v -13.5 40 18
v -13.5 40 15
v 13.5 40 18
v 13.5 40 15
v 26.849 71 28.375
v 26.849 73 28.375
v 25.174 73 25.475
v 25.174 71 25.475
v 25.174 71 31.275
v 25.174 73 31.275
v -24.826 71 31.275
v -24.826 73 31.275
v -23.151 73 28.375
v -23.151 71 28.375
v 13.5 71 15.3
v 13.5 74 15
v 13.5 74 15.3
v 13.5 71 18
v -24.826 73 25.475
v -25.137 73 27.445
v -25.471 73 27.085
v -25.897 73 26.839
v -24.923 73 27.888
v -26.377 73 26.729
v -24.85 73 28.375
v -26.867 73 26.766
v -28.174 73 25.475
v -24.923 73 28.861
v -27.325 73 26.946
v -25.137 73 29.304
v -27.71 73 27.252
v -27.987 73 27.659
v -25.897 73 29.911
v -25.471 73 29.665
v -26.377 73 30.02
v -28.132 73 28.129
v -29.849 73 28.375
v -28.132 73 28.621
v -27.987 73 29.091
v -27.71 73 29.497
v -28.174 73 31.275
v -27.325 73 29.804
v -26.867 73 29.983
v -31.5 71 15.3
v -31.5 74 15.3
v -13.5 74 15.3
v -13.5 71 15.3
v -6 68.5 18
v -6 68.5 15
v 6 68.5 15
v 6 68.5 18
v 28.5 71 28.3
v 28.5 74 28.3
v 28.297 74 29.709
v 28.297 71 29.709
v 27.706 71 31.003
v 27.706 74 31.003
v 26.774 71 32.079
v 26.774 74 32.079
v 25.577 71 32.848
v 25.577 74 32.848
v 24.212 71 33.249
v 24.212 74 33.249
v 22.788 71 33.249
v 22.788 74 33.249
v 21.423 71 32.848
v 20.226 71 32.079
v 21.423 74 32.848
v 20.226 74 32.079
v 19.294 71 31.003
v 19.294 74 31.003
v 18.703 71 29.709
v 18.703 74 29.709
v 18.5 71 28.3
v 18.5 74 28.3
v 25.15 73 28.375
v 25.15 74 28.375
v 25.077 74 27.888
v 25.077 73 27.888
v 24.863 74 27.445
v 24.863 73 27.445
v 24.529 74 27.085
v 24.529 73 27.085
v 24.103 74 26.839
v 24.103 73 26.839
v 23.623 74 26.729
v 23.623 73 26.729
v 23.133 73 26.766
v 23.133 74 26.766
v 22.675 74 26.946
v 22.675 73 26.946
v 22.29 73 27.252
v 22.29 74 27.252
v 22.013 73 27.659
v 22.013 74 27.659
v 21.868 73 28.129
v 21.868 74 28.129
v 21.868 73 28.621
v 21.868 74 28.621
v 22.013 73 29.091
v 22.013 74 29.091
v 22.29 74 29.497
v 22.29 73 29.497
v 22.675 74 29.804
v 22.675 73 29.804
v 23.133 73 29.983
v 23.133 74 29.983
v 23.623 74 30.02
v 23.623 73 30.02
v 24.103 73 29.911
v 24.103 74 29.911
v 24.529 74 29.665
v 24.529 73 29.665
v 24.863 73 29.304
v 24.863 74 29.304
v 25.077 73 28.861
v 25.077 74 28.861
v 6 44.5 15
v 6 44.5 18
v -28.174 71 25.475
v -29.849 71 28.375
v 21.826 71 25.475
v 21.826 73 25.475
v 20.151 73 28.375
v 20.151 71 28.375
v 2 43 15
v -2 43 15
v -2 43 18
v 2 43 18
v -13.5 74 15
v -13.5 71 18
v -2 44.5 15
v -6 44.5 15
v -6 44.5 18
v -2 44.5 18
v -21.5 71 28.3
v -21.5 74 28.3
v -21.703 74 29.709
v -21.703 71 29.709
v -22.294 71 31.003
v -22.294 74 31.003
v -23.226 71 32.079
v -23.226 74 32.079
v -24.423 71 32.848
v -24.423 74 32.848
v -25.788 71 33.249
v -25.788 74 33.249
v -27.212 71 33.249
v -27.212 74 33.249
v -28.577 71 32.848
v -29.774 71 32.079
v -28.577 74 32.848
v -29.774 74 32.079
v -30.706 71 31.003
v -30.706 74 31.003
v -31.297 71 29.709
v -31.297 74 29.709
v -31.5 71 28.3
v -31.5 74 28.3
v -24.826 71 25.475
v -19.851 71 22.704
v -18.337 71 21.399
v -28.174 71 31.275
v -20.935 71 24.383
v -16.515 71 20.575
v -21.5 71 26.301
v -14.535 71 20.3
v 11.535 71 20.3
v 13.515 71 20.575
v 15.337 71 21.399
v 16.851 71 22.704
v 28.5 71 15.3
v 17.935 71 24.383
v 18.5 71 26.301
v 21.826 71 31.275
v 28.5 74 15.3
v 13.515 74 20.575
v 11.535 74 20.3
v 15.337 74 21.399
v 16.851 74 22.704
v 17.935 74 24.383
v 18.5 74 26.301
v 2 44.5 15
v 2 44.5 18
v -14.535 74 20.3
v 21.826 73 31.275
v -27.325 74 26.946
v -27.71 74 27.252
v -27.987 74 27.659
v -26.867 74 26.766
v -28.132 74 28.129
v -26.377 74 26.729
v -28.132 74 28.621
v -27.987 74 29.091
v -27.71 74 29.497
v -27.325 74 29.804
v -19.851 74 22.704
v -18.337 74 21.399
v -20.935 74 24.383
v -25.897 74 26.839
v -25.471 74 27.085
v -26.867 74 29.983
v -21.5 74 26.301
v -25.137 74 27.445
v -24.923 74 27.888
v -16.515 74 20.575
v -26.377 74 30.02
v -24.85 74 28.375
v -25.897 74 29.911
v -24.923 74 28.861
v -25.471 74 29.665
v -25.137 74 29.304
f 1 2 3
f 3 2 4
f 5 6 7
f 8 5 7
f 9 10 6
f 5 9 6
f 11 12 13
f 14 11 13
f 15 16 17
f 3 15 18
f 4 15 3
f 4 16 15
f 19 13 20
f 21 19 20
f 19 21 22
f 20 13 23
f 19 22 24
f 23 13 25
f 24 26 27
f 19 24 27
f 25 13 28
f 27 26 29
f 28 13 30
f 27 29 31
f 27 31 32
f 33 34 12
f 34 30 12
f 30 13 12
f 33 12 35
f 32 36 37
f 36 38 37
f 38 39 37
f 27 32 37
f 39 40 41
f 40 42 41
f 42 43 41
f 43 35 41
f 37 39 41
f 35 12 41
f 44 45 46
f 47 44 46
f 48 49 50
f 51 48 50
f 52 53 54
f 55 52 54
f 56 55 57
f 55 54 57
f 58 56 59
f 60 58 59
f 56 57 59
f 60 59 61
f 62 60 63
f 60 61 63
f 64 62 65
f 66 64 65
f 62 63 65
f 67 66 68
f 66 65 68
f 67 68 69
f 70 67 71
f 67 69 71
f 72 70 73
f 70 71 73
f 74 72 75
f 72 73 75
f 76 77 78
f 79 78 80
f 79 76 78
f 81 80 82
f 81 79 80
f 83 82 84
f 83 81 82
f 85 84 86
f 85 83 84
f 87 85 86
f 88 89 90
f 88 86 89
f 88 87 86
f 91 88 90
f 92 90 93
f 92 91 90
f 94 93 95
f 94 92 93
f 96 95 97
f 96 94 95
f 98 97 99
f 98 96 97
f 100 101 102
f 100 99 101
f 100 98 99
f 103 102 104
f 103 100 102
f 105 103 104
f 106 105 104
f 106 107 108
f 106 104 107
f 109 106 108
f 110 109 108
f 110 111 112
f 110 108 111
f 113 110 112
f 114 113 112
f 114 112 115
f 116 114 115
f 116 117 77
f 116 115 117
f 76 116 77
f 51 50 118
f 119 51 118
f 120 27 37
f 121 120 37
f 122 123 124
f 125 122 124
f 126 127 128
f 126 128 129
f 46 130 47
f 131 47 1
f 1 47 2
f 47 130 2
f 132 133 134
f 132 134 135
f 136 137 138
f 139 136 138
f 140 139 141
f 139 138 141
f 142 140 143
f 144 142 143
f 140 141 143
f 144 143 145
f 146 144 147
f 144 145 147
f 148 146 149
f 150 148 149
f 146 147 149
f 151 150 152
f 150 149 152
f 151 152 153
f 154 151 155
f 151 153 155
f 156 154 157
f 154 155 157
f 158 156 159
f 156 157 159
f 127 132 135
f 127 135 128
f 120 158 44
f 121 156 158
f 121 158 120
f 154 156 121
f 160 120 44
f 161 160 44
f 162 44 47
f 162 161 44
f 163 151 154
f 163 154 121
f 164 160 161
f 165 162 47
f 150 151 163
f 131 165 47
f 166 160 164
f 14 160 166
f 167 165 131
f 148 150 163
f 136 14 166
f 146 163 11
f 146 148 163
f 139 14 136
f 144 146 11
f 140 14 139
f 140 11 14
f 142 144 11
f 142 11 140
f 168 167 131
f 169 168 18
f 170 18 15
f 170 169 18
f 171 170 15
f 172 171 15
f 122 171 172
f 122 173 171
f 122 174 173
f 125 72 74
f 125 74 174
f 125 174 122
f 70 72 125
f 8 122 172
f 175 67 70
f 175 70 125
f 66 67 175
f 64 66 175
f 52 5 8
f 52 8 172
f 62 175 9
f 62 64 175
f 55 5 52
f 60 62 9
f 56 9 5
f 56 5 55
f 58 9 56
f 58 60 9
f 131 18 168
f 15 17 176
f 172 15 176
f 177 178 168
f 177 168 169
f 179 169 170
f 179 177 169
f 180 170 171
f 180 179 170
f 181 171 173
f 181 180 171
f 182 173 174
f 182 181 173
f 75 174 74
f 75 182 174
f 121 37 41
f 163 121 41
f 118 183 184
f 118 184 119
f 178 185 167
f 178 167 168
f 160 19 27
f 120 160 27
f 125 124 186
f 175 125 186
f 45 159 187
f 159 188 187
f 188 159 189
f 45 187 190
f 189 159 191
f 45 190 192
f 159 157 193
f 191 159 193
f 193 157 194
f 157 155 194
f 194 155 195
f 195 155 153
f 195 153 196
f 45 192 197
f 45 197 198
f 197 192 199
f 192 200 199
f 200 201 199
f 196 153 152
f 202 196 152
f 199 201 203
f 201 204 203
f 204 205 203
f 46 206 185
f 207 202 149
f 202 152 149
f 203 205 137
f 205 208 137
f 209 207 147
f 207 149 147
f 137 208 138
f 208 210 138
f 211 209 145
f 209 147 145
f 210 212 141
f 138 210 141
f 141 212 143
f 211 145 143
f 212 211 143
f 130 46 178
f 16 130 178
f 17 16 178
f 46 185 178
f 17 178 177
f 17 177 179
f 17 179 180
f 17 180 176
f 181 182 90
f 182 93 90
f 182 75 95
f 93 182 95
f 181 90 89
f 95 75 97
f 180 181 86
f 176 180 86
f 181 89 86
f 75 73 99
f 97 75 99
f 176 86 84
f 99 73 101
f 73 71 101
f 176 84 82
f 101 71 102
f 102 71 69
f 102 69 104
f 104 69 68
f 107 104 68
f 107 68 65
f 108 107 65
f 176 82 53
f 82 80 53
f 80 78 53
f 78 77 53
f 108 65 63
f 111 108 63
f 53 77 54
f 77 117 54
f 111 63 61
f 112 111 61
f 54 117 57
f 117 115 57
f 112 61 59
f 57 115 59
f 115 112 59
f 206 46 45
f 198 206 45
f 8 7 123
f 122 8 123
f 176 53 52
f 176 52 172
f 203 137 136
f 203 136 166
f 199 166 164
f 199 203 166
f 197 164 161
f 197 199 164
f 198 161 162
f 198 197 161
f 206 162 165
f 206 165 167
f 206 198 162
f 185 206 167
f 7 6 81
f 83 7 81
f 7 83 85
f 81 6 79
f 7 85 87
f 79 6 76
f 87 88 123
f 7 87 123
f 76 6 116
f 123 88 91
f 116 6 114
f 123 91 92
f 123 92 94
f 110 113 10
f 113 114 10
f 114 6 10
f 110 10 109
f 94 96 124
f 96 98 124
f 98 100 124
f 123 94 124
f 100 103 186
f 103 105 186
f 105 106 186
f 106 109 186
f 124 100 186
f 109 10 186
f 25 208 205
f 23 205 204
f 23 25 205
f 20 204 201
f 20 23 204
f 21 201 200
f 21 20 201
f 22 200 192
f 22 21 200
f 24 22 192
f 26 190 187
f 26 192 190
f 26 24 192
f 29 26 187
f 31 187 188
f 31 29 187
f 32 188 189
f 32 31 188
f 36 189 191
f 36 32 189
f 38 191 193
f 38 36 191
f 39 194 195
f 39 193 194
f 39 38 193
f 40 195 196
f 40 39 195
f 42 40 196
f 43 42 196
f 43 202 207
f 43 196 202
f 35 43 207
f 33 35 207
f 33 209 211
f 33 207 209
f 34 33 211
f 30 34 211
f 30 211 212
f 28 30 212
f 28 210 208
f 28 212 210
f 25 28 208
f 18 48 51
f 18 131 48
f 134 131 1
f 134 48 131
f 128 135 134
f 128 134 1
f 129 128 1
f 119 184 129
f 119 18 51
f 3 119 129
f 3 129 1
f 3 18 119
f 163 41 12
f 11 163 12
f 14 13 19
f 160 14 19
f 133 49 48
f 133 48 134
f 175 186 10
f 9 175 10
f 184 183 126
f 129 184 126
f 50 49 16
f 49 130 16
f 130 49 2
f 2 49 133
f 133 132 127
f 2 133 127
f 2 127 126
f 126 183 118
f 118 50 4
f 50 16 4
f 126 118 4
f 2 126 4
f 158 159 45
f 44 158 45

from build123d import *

# Parameters (mm, degrees)
CYLINDER004_R             = 1.65
CYLINDER004_DEPTH         = 15
CYLINDER004_ROLL_ANGLE    = -90
PAD004_DEPTH              = 2.5
FUSION006_PLACEMENT_ANGLE = 90
CYLINDER005_R             = 1.65
CYLINDER005_DEPTH         = 15
CYLINDER005_ROLL_ANGLE    = -90
PAD002_DEPTH              = 2.5
FUSION005_PLACEMENT_ANGLE = 90
PAD003_DEPTH              = 3
BOX009_W                  = 4
BOX009_H                  = 4
BOX009_DEPTH              = 10
BOX011_W                  = 24
BOX011_H                  = 12
BOX011_DEPTH              = 10
BOX010_W                  = 34
BOX010_H                  = 27
BOX010_DEPTH              = 3
FUSION007_PLACEMENT_ANGLE = -90


with BuildPart() as cylinder004:
    # Cylinder004 → Cylinder004 (new body)
    with BuildSketch(Plane.XY):
        Circle(CYLINDER004_R)
    extrude(amount=CYLINDER004_DEPTH)


with BuildPart() as cylinder004_1:
    # Cylinder004 roll: moved
    add(cylinder004.part.rotate(Axis((0, 0, 0), (1, 0, 0)), CYLINDER004_ROLL_ANGLE))


with BuildPart() as cylinder004_2:
    # Cylinder004 placement: moved
    add(cylinder004_1.part)


with BuildPart() as tuercatal006:
    # Sketch → Pad004 (new body)
    with BuildSketch(Plane.XZ):
        Polygon((-3.348631, 0), (-1.674316, 2.9), (1.674316, 2.9), (3.348631, 0), (1.674316, -2.9), (-1.674316, -2.9), align=None)
    extrude(amount=PAD004_DEPTH)

    # Fusion006: union Cylinder004
    add(cylinder004_2.part)


with BuildPart() as tuercatal006_1:
    # Fusion006 placement: moved
    add(tuercatal006.part.moved(Location((1, -25, 28))).rotate(Axis((1, -25, 28), (0, 0, 1)), FUSION006_PLACEMENT_ANGLE))


with BuildPart() as cylinder005:
    # Cylinder005 → Cylinder005 (new body)
    with BuildSketch(Plane.XY):
        Circle(CYLINDER005_R)
    extrude(amount=CYLINDER005_DEPTH)


with BuildPart() as cylinder005_1:
    # Cylinder005 roll: moved
    add(cylinder005.part.rotate(Axis((0, 0, 0), (1, 0, 0)), CYLINDER005_ROLL_ANGLE))


with BuildPart() as cylinder005_2:
    # Cylinder005 placement: moved
    add(cylinder005_1.part)


with BuildPart() as tuercatal005:
    # Sketch → Pad002 (new body)
    with BuildSketch(Plane.XZ):
        Polygon((-3.348631, 0), (-1.674316, 2.9), (1.674316, 2.9), (3.348631, 0), (1.674316, -2.9), (-1.674316, -2.9), align=None)
    extrude(amount=PAD002_DEPTH)

    # Fusion005: union Cylinder005
    add(cylinder005_2.part)


with BuildPart() as tuercatal005_1:
    # Fusion005 placement: moved
    add(tuercatal005.part.moved(Location((1, 25, 28))).rotate(Axis((1, 25, 28), (0, 0, 1)), FUSION005_PLACEMENT_ANGLE))


with BuildPart() as cut011:
    # Sketch001 → Pad003 (new body)
    with BuildSketch(Plane.YZ):
        with BuildLine():
            Line((-30, 14.925301), (30, 14.925301))
            Line((30, 27.925301), (30, 14.925301))
            ThreePointArc((30, 27.925301), (25, 32.925301), (20, 27.925301))
            ThreePointArc((13.035099, 19.925301), (18.35131, 22.328806), (20, 27.925301))
            Line((-13.035099, 19.925301), (13.035099, 19.925301))
            ThreePointArc((-20, 27.925301), (-18.35131, 22.328806), (-13.035099, 19.925301))
            ThreePointArc((-20, 27.925301), (-25, 32.925301), (-30, 27.925301))
            Line((-30, 27.925301), (-30, 14.925301))
        make_face()
    extrude(amount=PAD003_DEPTH)

    # Cut010: cut TuercaTal005
    add(tuercatal005_1.part, mode=Mode.SUBTRACT)

    # Cut011: cut TuercaTal006
    add(tuercatal006_1.part, mode=Mode.SUBTRACT)


with BuildPart() as cut011_1:
    # Cut011 placement: moved
    add(cut011.part.moved(Location((-17, -1.5, 0.374699))))


with BuildPart() as cubo009:
    # Box009 → Box009 (new body)
    with BuildSketch(Plane(origin=(10, -2, 10), x_dir=(1, 0, 0), z_dir=(0, 0, 1))):
        with Locations((2, 2)):
            Rectangle(BOX009_W, BOX009_H)
    extrude(amount=BOX009_DEPTH)


with BuildPart() as cubo011:
    # Box011 → Box011 (new body)
    with BuildSketch(Plane(origin=(-11.5, -6, 11), x_dir=(1, 0, 0), z_dir=(0, 0, 1))):
        with Locations((12, 6)):
            Rectangle(BOX011_W, BOX011_H)
    extrude(amount=BOX011_DEPTH)


with BuildPart() as portabat:
    # Box010 → Box010 (new body)
    with BuildSketch(Plane(origin=(-17, -13.5, 15), x_dir=(1, 0, 0), z_dir=(0, 0, 1))):
        with Locations((17, 13.5)):
            Rectangle(BOX010_W, BOX010_H)
    extrude(amount=BOX010_DEPTH)

    # Cut012: cut Cubo011
    add(cubo011.part, mode=Mode.SUBTRACT)

    # Cut009: cut Cubo009
    add(cubo009.part, mode=Mode.SUBTRACT)

    # Fusion007: union Cut011
    add(cut011_1.part)


with BuildPart() as portabat_1:
    # Fusion007 placement: moved
    add(portabat.part.moved(Location((0, 57, 0))).rotate(Axis((0, 57, 0), (0, 0, 1)), FUSION007_PLACEMENT_ANGLE))


solid = portabat_1.part
